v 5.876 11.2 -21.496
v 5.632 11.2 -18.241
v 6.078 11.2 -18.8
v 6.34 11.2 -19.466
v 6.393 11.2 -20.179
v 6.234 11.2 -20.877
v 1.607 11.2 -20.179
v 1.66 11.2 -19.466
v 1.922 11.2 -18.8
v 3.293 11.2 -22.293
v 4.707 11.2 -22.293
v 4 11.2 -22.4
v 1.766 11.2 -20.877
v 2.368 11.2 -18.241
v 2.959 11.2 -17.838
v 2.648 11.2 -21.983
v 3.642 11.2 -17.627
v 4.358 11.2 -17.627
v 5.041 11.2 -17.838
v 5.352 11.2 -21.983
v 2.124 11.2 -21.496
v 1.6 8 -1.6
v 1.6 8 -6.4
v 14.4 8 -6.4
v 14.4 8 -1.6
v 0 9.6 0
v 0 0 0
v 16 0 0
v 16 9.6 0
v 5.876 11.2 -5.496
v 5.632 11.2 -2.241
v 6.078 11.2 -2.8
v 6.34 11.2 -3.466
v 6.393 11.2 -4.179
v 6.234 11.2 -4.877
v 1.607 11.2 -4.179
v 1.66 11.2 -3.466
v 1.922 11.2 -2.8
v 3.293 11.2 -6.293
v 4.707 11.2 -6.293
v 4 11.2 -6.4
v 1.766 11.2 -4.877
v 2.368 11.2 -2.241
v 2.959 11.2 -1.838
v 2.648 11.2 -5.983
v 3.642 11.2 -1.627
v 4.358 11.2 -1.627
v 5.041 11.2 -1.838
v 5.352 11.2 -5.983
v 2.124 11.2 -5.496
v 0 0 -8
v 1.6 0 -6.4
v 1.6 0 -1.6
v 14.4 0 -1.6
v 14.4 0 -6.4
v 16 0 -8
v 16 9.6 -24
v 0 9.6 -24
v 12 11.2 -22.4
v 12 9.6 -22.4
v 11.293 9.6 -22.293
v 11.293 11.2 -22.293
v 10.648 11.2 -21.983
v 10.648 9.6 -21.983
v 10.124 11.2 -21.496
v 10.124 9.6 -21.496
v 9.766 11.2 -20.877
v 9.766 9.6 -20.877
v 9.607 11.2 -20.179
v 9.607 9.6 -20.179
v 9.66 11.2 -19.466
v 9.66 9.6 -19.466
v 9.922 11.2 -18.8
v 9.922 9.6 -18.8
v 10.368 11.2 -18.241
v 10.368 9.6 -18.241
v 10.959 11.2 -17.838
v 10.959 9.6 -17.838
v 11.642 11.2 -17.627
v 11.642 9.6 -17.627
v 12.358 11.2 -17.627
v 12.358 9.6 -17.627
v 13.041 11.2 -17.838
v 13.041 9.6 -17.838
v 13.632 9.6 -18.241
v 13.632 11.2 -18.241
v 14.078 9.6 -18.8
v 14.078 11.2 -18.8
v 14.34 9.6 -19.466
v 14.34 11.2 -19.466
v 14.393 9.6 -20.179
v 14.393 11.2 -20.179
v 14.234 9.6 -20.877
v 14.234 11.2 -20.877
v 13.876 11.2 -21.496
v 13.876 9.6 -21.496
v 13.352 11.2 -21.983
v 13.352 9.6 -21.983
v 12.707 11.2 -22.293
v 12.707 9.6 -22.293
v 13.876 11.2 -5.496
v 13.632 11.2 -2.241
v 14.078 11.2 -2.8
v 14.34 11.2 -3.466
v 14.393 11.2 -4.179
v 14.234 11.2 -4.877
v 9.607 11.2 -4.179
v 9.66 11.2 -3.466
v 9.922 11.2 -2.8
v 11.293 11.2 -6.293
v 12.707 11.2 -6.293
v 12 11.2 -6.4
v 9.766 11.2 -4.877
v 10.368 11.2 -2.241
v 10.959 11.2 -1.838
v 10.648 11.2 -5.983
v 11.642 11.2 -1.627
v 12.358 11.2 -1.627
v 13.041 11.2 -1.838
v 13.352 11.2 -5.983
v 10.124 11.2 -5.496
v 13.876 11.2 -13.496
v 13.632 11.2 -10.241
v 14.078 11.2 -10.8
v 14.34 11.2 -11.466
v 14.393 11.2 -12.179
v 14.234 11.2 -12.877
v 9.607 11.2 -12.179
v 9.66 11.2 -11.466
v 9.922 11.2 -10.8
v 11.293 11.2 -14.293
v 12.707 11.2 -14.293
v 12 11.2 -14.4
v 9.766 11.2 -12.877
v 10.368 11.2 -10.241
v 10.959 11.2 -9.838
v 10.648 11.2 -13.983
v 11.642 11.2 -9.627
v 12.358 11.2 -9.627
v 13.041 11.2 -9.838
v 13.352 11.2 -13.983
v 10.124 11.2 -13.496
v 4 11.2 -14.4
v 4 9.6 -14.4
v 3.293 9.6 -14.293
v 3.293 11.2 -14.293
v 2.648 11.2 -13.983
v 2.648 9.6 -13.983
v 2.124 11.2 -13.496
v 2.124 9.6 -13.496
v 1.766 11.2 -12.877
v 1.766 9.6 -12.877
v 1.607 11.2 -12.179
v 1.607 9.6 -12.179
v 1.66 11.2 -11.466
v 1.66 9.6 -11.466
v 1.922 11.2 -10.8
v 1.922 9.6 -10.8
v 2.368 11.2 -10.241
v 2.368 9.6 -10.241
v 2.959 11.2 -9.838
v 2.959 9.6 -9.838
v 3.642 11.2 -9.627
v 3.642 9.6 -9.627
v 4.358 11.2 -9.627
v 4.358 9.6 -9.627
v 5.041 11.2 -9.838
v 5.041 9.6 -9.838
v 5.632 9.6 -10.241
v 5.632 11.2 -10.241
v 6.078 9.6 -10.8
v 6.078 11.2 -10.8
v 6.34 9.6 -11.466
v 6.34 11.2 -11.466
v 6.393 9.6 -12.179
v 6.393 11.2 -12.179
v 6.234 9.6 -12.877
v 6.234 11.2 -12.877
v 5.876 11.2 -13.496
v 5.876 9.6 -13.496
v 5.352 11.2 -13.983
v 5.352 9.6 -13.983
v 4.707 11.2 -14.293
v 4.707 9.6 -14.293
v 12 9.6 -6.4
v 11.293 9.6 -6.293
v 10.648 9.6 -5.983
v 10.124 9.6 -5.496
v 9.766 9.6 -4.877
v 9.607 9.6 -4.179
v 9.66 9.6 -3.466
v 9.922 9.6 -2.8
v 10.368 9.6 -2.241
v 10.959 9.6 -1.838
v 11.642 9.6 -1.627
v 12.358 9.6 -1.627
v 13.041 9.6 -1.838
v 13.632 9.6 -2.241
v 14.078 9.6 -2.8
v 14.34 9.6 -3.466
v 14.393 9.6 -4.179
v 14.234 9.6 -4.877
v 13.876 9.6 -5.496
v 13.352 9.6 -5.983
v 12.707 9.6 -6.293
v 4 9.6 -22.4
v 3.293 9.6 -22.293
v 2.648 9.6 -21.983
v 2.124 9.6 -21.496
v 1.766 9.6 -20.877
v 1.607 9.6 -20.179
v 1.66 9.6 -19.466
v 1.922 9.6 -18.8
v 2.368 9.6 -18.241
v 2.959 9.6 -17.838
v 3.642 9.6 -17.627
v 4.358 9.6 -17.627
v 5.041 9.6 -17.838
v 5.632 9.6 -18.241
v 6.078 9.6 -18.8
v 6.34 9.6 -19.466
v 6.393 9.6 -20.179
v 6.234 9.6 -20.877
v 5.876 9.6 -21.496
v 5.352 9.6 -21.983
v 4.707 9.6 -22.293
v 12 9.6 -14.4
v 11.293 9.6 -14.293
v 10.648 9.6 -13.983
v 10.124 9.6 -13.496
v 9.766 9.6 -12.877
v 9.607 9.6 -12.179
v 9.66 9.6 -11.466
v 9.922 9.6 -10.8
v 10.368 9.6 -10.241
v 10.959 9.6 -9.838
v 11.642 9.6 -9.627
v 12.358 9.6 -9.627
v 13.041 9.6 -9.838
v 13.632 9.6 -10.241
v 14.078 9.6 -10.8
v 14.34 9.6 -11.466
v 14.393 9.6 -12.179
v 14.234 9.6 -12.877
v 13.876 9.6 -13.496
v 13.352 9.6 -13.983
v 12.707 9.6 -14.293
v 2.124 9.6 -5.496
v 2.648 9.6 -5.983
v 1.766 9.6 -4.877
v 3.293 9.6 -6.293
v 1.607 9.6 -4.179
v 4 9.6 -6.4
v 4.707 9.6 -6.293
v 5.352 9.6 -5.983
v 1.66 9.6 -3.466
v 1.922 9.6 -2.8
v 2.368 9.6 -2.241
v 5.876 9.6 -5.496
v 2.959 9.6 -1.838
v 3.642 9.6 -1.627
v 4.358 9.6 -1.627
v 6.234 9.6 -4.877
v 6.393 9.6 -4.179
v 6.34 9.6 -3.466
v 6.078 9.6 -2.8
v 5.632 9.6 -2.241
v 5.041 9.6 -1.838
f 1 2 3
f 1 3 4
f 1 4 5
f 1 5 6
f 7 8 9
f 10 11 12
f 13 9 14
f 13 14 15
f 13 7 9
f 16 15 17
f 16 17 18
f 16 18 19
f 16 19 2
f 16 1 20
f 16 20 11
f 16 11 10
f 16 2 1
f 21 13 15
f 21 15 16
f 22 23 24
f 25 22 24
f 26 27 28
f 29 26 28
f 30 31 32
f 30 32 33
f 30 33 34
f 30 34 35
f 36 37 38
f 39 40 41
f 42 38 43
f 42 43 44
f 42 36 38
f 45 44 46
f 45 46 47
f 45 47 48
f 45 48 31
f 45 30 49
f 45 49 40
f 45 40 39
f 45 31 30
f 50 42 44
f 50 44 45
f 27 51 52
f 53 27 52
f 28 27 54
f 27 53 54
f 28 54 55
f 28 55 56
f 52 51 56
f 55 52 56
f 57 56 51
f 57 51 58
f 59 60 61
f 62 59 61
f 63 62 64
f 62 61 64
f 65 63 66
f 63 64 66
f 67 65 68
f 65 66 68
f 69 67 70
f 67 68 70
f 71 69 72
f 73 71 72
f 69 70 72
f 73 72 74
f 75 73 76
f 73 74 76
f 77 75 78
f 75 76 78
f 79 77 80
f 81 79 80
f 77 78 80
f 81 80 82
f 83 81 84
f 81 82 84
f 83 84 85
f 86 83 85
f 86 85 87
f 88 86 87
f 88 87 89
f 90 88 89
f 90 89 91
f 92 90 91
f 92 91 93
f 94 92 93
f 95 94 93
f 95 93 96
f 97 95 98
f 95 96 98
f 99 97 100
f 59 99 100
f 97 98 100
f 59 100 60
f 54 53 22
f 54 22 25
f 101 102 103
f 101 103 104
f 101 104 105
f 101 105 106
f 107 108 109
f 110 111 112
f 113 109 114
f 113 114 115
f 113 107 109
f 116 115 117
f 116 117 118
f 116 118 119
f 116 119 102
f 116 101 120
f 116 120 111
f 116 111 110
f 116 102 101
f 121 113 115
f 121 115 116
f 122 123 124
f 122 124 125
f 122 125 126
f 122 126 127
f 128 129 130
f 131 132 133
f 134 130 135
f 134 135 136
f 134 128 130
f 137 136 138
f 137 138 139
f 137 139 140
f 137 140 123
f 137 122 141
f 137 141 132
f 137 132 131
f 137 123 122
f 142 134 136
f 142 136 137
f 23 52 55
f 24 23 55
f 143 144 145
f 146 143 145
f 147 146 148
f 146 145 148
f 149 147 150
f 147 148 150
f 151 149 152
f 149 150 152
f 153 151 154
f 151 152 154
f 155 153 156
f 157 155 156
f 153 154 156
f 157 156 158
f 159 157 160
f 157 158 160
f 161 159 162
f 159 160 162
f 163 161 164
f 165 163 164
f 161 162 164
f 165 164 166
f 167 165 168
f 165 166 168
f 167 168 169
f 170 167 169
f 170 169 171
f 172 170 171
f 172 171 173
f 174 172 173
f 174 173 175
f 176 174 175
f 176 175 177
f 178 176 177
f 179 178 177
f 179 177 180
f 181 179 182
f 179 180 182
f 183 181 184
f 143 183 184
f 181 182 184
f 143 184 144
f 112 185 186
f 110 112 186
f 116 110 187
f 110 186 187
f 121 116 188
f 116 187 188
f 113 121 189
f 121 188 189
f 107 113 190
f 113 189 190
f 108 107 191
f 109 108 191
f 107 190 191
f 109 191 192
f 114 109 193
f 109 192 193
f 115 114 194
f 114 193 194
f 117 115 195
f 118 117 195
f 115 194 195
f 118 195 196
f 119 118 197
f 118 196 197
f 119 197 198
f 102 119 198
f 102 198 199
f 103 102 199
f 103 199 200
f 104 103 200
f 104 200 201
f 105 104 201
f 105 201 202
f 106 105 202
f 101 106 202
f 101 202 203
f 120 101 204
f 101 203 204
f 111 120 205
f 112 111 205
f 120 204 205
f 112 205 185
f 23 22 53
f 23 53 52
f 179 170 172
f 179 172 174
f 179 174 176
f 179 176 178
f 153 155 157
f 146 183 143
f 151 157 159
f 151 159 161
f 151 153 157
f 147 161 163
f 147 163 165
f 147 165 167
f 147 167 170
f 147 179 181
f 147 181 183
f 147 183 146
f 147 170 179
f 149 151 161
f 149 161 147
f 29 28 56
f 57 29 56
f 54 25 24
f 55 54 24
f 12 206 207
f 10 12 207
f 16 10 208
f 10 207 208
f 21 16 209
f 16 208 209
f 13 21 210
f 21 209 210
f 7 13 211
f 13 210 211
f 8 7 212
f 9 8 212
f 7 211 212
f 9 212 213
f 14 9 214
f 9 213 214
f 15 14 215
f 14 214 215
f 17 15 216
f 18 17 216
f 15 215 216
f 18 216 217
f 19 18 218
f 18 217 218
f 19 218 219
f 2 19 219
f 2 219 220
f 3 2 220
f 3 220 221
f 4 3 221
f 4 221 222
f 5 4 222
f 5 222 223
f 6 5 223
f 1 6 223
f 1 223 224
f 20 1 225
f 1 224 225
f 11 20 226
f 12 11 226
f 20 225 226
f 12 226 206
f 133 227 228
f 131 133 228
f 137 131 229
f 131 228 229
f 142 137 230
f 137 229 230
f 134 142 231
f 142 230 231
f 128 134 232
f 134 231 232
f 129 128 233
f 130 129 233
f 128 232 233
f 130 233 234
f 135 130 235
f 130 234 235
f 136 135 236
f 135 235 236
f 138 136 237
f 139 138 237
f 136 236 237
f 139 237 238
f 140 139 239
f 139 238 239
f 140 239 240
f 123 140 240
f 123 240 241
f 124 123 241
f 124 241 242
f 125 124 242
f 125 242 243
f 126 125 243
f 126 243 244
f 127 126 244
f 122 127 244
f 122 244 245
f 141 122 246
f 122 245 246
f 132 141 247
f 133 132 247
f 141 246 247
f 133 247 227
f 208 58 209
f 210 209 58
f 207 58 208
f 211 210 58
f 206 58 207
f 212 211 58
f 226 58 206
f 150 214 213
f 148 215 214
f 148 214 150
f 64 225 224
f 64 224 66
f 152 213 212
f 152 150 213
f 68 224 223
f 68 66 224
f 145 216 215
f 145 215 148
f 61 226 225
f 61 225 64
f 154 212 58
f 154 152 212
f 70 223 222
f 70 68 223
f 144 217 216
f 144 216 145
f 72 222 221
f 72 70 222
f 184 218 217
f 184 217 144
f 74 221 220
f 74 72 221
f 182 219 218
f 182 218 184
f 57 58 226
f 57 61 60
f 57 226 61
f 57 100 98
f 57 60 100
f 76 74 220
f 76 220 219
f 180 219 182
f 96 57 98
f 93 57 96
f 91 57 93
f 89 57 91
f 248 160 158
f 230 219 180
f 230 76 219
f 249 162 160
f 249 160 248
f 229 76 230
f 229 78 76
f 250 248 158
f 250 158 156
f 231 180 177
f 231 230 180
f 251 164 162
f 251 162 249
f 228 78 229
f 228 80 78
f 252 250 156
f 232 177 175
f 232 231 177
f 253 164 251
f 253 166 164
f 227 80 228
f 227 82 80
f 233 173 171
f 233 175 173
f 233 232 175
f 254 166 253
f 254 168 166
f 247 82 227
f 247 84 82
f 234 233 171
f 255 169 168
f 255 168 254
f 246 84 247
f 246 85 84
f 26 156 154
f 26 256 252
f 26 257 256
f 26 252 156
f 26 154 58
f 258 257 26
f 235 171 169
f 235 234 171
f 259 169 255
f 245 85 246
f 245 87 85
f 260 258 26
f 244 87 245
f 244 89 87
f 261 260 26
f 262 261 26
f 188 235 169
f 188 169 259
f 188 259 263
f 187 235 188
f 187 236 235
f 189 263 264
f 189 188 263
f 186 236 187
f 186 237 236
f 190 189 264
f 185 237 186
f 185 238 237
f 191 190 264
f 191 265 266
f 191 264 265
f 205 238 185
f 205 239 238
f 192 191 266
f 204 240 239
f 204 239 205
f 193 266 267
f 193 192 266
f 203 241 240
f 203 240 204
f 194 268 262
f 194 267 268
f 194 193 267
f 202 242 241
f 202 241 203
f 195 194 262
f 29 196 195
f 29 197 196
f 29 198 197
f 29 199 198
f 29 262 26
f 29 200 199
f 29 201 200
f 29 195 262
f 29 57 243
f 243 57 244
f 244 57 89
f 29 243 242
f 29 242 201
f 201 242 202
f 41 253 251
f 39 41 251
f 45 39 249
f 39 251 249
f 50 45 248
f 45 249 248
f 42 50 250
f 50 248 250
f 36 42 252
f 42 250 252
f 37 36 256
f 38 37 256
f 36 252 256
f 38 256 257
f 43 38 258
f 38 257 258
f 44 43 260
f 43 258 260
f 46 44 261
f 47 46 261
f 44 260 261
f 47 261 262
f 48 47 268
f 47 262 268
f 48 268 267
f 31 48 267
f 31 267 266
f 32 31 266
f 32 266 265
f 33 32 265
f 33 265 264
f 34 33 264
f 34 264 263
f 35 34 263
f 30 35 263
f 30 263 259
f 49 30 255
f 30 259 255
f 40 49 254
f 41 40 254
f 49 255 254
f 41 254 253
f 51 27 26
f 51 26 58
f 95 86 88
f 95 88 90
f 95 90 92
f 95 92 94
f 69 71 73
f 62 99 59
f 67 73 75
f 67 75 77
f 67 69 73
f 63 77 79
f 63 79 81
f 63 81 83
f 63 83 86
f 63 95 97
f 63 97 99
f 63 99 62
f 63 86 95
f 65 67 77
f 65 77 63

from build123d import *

# Parameters (mm, degrees)
SKETCH1_W            = 16
SKETCH1_H            = 8
BOSS_EXTRUDE1_DEPTH  = 9.6
SHELL1_T             = -1.6
BOSS_EXTRUDE3_DEPTH  = 16
SKETCH2_R            = 2.4
BOSS_EXTRUDE2_DEPTH  = 1.6
LPATTERN1_COUNT      = 2
LPATTERN1_PITCH      = 8
LPATTERN1_COUNT_DIR2 = 3
LPATTERN1_PITCH_DIR2 = 8


with BuildPart() as part:
    # Sketch1 → Boss-Extrude1 (new body)
    with BuildSketch(Plane(origin=(0, 0, 0), x_dir=(1, 0, 0), z_dir=(0, 1, 0))):
        with Locations((8, 4)):
            Rectangle(SKETCH1_W, SKETCH1_H)
    extrude(amount=BOSS_EXTRUDE1_DEPTH)

    # Shell1
    shell1_openings = [part.faces().sort_by_distance(p)[0] for p in [
        (8, 0, -4),
    ]]
    offset(amount=SHELL1_T, openings=shell1_openings, kind=Kind.INTERSECTION)

    # Sketch3 → Boss-Extrude3 (add)
    with BuildSketch(Plane(origin=(16, 0, 0), x_dir=(0, 0, -1), z_dir=(1, 0, 0))):
        Polygon((8, 0), (24, 9.6), (8, 9.6), align=None)
    extrude(amount=-BOSS_EXTRUDE3_DEPTH)

    # Sketch2 → Boss-Extrude2 (add)
    with BuildSketch(Plane(origin=(0, 9.6, 0), x_dir=(1, 0, 0), z_dir=(0, 1, 0))):
        with Locations(Location((12, 4, 0), (0, 0, 90))):
            Circle(SKETCH2_R)
    boss_extrude2 = extrude(amount=BOSS_EXTRUDE2_DEPTH)

    # LPattern1: Boss-Extrude2 2 × 3
    with Locations(*[(-i * LPATTERN1_PITCH, 0, -j * LPATTERN1_PITCH_DIR2) for i in range(LPATTERN1_COUNT) for j in range(LPATTERN1_COUNT_DIR2) if (i, j) != (0, 0)]):
        add(boss_extrude2)


solid = part.part
